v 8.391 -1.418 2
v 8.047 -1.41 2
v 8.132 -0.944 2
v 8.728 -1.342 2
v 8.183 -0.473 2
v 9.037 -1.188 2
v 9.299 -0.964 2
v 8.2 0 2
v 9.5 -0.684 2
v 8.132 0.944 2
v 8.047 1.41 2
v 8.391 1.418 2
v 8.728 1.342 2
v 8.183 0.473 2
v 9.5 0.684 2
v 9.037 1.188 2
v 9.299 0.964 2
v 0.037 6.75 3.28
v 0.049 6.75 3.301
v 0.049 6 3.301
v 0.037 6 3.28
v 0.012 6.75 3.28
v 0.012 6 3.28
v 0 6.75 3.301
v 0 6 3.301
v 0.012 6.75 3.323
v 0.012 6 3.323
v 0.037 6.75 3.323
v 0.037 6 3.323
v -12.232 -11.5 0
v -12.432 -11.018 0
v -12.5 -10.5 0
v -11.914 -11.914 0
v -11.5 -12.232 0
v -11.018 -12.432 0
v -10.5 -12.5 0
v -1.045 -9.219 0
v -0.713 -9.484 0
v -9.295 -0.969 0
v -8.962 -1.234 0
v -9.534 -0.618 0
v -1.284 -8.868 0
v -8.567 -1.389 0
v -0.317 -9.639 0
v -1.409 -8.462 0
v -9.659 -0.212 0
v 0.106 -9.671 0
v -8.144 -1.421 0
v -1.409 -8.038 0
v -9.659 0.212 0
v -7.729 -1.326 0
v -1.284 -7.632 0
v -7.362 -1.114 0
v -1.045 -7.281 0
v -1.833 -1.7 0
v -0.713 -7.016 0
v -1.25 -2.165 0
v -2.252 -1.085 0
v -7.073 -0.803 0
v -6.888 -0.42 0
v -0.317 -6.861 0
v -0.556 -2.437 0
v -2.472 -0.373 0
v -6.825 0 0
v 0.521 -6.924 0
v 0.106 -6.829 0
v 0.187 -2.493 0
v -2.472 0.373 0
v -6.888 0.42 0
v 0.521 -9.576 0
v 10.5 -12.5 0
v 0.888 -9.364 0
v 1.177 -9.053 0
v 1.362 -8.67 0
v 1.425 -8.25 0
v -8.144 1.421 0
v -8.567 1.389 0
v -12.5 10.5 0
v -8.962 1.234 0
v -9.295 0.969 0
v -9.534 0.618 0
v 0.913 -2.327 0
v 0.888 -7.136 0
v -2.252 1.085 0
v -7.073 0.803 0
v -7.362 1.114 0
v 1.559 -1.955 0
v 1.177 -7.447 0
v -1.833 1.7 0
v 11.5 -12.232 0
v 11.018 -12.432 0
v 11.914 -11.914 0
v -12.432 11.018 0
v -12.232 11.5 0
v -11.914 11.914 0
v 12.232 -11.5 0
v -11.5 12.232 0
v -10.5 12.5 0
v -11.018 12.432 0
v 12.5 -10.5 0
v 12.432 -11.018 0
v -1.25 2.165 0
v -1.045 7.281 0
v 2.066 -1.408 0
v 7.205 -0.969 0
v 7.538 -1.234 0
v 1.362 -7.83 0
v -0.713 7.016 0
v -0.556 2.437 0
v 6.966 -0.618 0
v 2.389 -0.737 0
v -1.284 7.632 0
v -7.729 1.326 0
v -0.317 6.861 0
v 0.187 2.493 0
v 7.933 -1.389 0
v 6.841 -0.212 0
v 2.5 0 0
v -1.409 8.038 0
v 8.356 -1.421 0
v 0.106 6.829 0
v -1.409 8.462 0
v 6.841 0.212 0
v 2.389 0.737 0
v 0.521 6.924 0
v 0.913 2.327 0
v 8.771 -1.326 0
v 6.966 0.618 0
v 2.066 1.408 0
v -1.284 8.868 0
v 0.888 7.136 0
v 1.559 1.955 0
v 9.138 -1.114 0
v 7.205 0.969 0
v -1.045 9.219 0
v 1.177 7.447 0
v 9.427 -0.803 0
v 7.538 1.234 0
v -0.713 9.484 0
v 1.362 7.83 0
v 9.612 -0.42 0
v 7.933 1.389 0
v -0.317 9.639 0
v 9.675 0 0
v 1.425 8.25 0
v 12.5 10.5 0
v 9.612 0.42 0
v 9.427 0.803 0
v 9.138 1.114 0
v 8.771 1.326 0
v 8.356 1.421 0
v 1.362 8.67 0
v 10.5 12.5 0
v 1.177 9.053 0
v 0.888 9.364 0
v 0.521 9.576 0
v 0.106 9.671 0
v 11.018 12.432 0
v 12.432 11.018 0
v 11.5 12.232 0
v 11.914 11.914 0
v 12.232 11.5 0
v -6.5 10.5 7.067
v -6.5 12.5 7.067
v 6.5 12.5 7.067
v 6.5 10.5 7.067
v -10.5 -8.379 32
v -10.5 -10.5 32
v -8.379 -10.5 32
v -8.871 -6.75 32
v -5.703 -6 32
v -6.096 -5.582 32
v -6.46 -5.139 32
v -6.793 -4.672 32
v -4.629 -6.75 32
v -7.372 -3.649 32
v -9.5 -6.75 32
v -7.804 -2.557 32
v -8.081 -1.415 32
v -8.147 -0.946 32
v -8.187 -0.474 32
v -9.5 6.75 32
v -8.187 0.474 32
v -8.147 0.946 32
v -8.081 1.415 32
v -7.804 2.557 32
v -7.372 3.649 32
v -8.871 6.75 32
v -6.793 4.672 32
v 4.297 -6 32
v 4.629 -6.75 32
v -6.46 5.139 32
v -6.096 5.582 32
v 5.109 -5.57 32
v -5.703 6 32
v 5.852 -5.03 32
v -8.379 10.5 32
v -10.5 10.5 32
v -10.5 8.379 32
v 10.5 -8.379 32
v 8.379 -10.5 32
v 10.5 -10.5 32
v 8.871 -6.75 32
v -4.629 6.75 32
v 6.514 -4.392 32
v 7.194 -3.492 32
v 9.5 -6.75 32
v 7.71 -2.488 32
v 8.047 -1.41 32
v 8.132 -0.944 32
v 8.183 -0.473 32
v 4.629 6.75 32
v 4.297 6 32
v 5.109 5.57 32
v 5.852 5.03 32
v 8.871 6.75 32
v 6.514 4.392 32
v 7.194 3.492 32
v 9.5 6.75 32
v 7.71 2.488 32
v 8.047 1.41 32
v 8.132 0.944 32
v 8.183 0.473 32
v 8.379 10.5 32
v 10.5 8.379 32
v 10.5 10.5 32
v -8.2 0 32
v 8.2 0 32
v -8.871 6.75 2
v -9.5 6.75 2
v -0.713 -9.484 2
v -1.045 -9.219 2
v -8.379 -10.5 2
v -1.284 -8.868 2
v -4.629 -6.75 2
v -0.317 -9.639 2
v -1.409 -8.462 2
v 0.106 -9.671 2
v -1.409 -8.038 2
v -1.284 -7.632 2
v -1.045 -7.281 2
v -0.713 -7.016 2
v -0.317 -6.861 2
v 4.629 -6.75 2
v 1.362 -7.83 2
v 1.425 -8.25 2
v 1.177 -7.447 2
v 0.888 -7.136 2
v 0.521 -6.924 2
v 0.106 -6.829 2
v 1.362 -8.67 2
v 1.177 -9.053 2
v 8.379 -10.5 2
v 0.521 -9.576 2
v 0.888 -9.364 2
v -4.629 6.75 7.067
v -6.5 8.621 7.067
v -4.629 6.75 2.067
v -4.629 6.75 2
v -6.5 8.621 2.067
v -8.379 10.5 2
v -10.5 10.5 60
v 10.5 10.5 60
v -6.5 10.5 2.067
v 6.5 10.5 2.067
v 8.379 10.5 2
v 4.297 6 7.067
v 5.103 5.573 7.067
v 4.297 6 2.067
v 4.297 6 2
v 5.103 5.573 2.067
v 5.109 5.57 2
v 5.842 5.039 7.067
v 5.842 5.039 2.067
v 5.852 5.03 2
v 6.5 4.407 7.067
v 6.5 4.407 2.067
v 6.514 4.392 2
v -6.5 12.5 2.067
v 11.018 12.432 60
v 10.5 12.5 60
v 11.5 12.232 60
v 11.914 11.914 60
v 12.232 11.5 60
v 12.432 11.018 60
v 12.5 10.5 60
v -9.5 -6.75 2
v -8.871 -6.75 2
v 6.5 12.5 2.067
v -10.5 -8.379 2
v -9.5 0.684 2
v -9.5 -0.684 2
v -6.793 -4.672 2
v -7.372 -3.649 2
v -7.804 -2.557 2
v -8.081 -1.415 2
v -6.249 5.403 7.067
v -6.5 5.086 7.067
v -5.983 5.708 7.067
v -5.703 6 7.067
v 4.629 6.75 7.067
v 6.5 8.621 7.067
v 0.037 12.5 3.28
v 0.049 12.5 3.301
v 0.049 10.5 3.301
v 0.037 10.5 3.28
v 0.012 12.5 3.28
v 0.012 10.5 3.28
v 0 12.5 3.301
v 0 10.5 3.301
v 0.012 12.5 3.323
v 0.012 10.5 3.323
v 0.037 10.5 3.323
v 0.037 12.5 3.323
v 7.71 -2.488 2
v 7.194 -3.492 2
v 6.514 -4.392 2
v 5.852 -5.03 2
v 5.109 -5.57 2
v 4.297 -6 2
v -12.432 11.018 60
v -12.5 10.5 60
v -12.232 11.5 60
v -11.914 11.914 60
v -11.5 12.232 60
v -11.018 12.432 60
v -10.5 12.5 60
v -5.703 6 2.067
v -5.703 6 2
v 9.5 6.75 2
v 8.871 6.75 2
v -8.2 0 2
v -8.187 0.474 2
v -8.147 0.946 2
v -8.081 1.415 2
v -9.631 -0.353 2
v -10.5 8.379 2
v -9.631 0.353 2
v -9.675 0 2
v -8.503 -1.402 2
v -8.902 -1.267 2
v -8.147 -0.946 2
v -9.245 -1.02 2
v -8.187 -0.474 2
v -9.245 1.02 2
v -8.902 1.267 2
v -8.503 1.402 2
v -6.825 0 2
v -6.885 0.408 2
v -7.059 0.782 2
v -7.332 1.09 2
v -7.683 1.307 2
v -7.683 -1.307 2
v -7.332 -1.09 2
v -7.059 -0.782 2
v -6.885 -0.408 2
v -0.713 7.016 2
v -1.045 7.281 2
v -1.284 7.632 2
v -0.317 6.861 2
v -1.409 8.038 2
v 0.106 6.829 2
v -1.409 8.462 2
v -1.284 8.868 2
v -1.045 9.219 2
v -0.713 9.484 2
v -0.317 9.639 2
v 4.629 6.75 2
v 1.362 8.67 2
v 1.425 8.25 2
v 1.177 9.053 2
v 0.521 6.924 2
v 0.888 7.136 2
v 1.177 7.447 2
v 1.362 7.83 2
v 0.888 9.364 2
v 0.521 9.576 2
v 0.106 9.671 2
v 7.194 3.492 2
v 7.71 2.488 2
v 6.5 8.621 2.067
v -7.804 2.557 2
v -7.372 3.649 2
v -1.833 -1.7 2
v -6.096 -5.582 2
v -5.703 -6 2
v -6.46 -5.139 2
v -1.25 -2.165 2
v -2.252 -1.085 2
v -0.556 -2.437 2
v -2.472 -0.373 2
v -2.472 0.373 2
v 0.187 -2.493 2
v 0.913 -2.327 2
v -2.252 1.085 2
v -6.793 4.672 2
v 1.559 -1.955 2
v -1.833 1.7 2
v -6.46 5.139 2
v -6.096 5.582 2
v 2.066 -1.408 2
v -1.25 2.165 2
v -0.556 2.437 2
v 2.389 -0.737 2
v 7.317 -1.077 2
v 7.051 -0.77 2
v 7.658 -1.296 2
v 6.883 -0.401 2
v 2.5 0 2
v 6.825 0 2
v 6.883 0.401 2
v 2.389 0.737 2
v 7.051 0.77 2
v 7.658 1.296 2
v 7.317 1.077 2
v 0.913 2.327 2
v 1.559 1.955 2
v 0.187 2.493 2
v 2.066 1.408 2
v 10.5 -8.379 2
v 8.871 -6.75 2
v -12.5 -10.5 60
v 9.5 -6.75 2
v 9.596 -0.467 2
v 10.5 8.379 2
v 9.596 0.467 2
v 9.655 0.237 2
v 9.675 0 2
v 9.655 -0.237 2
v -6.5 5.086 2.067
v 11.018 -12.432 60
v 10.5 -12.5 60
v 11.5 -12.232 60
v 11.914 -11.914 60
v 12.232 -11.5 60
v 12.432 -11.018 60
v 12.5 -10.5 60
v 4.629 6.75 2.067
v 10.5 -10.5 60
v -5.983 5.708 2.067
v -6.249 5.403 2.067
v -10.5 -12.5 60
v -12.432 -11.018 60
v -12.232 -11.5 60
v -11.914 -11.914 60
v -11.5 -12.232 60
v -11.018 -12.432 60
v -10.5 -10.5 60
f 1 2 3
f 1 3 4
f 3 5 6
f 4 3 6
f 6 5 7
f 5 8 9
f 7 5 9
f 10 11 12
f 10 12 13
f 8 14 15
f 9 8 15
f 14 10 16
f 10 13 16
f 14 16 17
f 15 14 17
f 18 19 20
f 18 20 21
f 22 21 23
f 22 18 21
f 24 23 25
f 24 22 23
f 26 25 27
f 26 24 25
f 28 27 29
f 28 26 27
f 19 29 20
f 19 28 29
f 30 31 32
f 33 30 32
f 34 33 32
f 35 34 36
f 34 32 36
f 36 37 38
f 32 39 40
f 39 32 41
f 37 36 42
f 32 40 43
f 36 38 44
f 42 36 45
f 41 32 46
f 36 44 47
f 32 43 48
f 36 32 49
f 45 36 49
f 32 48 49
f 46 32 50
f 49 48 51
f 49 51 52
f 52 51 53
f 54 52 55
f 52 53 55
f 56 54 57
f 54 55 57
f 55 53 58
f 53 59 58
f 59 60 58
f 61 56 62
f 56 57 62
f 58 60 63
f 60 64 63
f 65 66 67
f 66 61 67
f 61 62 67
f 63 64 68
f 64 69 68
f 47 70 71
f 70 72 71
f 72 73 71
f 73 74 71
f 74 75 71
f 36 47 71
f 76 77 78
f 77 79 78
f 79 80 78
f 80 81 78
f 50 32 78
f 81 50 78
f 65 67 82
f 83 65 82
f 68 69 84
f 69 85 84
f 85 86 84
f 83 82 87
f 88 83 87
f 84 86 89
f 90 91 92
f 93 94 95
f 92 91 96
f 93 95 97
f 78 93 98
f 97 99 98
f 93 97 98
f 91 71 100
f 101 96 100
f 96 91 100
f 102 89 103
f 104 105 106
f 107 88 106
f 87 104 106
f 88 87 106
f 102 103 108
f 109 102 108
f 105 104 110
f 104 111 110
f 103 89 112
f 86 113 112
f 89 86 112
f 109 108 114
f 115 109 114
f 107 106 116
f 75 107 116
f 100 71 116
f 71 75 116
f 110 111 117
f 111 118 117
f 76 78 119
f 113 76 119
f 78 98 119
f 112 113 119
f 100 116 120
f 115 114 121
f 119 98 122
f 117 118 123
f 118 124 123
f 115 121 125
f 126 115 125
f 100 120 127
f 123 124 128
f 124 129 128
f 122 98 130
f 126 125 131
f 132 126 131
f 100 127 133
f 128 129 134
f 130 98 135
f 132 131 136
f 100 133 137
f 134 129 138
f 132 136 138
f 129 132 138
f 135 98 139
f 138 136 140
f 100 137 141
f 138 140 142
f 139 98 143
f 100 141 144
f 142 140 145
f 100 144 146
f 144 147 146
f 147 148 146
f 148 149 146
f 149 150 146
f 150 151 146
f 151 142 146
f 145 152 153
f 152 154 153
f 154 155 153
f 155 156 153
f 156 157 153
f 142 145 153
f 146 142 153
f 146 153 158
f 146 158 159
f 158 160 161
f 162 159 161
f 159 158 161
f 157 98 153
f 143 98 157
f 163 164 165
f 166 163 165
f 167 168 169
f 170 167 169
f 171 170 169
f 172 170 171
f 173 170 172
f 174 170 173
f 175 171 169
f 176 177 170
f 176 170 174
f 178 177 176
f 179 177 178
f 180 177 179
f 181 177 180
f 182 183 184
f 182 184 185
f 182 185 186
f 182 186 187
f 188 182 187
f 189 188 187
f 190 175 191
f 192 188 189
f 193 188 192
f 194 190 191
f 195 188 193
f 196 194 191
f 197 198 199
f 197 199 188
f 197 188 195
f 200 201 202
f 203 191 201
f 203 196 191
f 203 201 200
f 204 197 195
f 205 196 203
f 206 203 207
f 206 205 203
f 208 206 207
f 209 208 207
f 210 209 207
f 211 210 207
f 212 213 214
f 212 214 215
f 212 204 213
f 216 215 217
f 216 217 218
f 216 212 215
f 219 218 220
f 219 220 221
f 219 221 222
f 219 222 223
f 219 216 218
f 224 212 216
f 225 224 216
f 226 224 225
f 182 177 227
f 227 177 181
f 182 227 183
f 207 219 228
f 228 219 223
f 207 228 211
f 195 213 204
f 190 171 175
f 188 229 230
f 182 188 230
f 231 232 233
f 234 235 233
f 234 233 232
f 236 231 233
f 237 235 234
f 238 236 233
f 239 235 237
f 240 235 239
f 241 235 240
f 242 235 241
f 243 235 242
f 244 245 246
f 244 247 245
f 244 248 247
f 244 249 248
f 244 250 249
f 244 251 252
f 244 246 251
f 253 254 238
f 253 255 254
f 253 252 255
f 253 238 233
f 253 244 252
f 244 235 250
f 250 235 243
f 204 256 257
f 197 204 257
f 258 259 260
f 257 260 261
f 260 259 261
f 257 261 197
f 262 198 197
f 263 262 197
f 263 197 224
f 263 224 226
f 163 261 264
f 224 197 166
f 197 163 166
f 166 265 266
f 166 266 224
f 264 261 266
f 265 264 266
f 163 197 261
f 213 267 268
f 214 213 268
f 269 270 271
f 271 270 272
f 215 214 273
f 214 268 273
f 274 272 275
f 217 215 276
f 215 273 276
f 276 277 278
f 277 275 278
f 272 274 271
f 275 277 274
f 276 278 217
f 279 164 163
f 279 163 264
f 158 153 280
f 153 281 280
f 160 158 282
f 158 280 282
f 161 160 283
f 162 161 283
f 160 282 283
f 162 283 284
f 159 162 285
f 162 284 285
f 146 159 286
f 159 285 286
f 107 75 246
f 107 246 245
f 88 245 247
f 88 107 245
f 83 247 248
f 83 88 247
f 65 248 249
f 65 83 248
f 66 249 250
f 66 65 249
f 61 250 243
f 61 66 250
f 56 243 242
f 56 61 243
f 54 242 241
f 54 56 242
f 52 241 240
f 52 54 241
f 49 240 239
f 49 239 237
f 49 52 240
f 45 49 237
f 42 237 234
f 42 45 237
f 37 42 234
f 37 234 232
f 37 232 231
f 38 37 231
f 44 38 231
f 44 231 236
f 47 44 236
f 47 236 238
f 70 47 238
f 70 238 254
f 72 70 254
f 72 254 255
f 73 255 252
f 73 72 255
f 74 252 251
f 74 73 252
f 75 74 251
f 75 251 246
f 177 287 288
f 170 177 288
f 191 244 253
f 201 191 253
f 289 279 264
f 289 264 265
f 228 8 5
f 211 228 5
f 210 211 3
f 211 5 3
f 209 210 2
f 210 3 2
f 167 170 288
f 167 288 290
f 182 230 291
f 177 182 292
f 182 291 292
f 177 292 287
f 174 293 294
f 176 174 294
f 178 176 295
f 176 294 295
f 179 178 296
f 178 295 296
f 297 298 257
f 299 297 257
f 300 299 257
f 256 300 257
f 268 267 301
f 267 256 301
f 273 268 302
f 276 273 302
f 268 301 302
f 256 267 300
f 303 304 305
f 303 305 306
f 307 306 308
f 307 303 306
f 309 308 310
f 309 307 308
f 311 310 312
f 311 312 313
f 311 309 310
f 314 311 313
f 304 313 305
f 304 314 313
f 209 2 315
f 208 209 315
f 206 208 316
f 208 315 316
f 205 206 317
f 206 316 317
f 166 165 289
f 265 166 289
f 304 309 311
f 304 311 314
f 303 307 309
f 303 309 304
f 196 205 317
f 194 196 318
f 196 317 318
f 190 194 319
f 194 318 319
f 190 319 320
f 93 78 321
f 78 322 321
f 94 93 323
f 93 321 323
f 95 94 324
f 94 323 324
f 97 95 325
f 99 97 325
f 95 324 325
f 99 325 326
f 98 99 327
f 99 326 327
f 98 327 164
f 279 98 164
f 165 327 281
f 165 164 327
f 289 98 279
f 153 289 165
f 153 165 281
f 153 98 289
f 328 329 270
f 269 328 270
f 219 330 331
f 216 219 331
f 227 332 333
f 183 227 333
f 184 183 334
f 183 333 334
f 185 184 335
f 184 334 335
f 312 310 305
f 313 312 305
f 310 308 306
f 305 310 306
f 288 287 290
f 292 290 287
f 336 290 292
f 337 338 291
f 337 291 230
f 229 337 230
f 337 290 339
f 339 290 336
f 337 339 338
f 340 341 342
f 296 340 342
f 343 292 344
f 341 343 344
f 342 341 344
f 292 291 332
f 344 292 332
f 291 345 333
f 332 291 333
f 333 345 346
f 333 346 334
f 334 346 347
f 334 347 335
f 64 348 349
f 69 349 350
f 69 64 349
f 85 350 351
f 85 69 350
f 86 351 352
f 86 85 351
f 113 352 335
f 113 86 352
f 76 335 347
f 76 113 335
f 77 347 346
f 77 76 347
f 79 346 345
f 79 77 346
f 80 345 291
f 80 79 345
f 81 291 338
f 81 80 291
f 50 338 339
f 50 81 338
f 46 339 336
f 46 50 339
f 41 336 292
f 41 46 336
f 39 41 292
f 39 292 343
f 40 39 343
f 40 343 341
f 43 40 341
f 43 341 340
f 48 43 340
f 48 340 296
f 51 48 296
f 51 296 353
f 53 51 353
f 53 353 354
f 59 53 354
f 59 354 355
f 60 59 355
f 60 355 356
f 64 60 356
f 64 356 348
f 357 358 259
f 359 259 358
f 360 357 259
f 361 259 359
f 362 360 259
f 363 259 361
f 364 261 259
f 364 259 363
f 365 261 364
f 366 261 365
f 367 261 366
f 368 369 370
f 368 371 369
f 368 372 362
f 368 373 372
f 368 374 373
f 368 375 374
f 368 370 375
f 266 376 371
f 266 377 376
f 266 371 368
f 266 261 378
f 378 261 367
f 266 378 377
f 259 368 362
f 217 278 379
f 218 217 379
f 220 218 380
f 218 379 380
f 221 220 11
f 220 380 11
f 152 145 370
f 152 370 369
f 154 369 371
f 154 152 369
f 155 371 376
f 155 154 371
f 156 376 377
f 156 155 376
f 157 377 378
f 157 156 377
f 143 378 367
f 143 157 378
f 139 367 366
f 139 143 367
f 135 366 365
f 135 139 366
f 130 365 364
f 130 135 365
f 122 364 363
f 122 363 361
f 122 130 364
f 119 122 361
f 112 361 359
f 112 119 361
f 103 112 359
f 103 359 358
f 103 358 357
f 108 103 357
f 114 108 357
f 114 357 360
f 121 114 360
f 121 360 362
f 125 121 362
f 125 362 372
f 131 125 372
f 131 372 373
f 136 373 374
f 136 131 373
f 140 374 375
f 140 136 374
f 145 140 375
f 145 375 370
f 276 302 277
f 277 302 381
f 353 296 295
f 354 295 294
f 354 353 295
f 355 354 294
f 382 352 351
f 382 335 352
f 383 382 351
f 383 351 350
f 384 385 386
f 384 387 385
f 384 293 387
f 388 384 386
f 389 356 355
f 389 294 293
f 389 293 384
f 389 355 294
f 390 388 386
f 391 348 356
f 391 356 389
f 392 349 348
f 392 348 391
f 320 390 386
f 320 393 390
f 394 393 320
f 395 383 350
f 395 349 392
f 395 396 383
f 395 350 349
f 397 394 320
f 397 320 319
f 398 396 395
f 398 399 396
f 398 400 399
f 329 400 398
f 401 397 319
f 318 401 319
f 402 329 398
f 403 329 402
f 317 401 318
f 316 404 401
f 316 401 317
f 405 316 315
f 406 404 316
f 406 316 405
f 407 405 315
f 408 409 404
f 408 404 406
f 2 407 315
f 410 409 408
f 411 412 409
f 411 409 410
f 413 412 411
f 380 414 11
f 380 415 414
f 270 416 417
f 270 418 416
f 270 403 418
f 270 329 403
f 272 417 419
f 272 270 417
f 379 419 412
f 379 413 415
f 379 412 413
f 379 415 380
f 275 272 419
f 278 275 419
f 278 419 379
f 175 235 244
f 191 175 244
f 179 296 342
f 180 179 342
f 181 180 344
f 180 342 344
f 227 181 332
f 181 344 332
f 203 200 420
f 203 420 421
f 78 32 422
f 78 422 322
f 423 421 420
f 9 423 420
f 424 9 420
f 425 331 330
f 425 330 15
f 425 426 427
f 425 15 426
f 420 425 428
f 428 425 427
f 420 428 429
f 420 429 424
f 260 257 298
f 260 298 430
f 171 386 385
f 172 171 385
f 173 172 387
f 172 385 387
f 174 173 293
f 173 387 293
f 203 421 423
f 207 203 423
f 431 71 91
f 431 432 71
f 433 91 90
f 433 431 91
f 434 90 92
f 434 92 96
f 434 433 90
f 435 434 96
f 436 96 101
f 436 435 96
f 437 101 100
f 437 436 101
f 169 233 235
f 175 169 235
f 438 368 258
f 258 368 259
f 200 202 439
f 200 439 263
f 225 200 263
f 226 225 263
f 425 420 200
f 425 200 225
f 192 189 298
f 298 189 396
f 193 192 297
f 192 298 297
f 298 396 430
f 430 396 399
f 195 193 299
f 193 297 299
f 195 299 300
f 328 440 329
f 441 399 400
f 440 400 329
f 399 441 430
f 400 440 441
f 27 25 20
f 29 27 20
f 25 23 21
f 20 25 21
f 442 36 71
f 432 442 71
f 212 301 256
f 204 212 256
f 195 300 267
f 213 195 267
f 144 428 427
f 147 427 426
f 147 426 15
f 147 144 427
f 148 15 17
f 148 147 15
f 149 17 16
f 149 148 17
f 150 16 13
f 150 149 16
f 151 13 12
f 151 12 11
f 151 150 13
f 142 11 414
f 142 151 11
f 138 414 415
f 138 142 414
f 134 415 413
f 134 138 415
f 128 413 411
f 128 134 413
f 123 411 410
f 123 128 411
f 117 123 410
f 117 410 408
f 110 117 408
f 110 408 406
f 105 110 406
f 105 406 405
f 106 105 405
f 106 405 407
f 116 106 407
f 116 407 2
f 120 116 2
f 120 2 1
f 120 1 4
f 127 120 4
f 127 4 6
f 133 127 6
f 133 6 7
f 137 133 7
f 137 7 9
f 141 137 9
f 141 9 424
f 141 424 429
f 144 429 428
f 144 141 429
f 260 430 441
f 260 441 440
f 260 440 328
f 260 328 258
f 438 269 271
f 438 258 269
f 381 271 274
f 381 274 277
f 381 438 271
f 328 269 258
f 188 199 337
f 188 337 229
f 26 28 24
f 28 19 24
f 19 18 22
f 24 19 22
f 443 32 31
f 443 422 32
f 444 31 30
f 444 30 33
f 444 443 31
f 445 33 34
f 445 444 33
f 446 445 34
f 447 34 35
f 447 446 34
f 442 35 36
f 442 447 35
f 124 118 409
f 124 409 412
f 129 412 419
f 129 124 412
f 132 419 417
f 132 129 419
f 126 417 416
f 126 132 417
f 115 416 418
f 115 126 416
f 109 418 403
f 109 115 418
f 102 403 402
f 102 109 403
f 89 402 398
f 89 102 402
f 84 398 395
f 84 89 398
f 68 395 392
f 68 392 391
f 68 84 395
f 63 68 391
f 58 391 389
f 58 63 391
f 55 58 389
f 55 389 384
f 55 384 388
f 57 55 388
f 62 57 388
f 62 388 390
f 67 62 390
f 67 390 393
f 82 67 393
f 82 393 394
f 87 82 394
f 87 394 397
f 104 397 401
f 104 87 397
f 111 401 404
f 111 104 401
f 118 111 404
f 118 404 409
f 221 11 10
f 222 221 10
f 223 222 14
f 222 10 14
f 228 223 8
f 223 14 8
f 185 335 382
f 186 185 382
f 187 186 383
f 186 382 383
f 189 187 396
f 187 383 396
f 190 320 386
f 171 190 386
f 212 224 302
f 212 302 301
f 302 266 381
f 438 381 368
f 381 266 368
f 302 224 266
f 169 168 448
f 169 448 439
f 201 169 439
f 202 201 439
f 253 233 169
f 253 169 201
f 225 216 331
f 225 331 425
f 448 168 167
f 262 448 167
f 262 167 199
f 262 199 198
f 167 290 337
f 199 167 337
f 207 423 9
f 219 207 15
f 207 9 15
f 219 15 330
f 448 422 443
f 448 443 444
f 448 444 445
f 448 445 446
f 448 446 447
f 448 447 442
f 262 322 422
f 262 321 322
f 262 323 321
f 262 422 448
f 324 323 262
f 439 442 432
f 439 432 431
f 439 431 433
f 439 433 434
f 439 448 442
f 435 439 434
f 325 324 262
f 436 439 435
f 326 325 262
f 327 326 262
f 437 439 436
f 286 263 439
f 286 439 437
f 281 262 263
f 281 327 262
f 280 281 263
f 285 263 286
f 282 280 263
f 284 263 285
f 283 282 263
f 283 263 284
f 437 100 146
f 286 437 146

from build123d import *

# Parameters (mm, degrees)
SKETCH1_W           = 25
SKETCH1_H           = 25
BOSS_EXTRUDE1_DEPTH = 60
SHELL1_T            = -2
SKETCH2_R           = 2.5
SKETCH2_R_2         = 1.425
CUT_EXTRUDE4_DEPTH  = 2
BOSS_EXTRUDE3_DEPTH = 30
FILLET1_R           = 2
SKETCH5_W           = 13
SKETCH5_H           = 5
SKETCH5_R           = 0.024622166
CUT_EXTRUDE6_DEPTH  = 10


with BuildPart() as part:
    # Sketch1 → Boss-Extrude1 (new body)
    with BuildSketch(Plane.XY):
        Rectangle(SKETCH1_W, SKETCH1_H)
    extrude(amount=BOSS_EXTRUDE1_DEPTH)

    # Shell1
    shell1_openings = [part.faces().sort_by_distance(p)[0] for p in [
        (0, 0, 60),
    ]]
    offset(amount=SHELL1_T, openings=shell1_openings, kind=Kind.INTERSECTION)

    # Sketch2 → Cut-Extrude4 (cut)
    with BuildSketch(Plane.XY):
        Circle(SKETCH2_R)
        with Locations((8.25, 0)):
            Circle(SKETCH2_R_2)
        with Locations((0, -8.25)):
            Circle(SKETCH2_R_2)
        with Locations((-8.25, 0)):
            Circle(SKETCH2_R_2)
        with Locations((0, 8.25)):
            Circle(SKETCH2_R_2)
    extrude(amount=CUT_EXTRUDE4_DEPTH, mode=Mode.SUBTRACT)

    # Sketch4 → Boss-Extrude3 (add)
    with BuildSketch(Plane.XY.offset(2)):
        with BuildLine():
            Line((-8.871320344, 6.75), (-6.792832126, 4.671511782))
            ThreePointArc((-6.792832126, 4.671511782), (-6.28187766, 5.363494358), (-5.703280287, 6))
            Line((-5.703280287, 6), (-3.878679656, 6))
            Line((-3.878679656, 6), (-4.628679656, 6.75))
            Line((-4.628679656, 6.75), (-8.871320344, 6.75))
        make_face()
        Polygon((-10.5, 8.378679656), (-8.871320344, 6.75), (-4.628679656, 6.75), (-8.378679656, 10.5), (-10.5, 10.5), align=None)
        Polygon((-3.878679656, 6), (0, 6), (3.878679656, 6), (4.628679656, 6.75), (-4.628679656, 6.75), align=None)
        Polygon((8.378679656, 10.5), (4.628679656, 6.75), (8.871320344, 6.75), (10.5, 8.378679656), (10.5, 10.5), align=None)
        with BuildLine():
            Line((4.628679656, 6.75), (3.878679656, 6))
            Line((3.878679656, 6), (4.296719713, 6))
            ThreePointArc((4.296719713, 6), (5.489948643, 5.313054416), (6.513606116, 4.392285772))
            Line((6.513606116, 4.392285772), (8.871320344, 6.75))
            Line((8.871320344, 6.75), (4.628679656, 6.75))
        make_face()
        with BuildLine():
            ThreePointArc((-5.703280287, -6), (-6.28187766, -5.363494358), (-6.792832126, -4.671511782))
            Line((-6.792832126, -4.671511782), (-8.871320344, -6.75))
            Line((-8.871320344, -6.75), (-4.628679656, -6.75))
            Line((-4.628679656, -6.75), (-3.878679656, -6))
            Line((-3.878679656, -6), (-5.703280287, -6))
        make_face()
        with BuildLine():
            Line((4.296719713, -6), (3.878679656, -6))
            Line((3.878679656, -6), (4.628679656, -6.75))
            Line((4.628679656, -6.75), (8.871320344, -6.75))
            Line((8.871320344, -6.75), (6.513606116, -4.392285772))
            ThreePointArc((6.513606116, -4.392285772), (5.489948643, -5.313054416), (4.296719713, -6))
        make_face()
        Polygon((-4.628679656, -6.75), (-8.871320344, -6.75), (-10.5, -8.378679656), (-10.5, -10.5), (-8.378679656, -10.5), align=None)
        Polygon((8.871320344, -6.75), (4.628679656, -6.75), (8.378679656, -10.5), (10.5, -10.5), (10.5, -8.378679656), align=None)
        with BuildLine():
            Line((8.871320344, 6.75), (6.513606116, 4.392285772))
            ThreePointArc((6.513606116, 4.392285772), (7.473760778, 3.000900651), (8.046659593, 1.410417555))
            ThreePointArc((8.046659593, 1.410417555), (8.886964121, 1.274716325), (9.5, 0.684196609))
            Line((9.5, 0.684196609), (9.5, 6.75))
            Line((9.5, 6.75), (8.871320344, 6.75))
        make_face()
        with BuildLine():
            ThreePointArc((8.046659593, -1.410417555), (7.473760778, -3.000900651), (6.513606116, -4.392285772))
            Line((6.513606116, -4.392285772), (8.871320344, -6.75))
            Line((8.871320344, -6.75), (9.5, -6.75))
            Line((9.5, -6.75), (9.5, -0.684196609))
            ThreePointArc((9.5, -0.684196609), (8.886964121, -1.274716325), (8.046659593, -1.410417555))
        make_face()
        Polygon((3.878679656, -6), (0, -6), (-3.878679656, -6), (-4.628679656, -6.75), (4.628679656, -6.75), align=None)
        with BuildLine():
            ThreePointArc((-6.792832126, -4.671511782), (-7.607218745, -3.110608316), (-8.080808179, -1.414920184))
            ThreePointArc((-8.080808179, -1.414920184), (-8.902323398, -1.26692509), (-9.5, -0.684196609))
            Line((-9.5, -0.684196609), (-9.5, -6.75))
            Line((-9.5, -6.75), (-8.871320344, -6.75))
            Line((-8.871320344, -6.75), (-6.792832126, -4.671511782))
        make_face()
        with BuildLine():
            ThreePointArc((-9.5, 0.684196609), (-8.902323398, 1.26692509), (-8.080808179, 1.414920184))
            ThreePointArc((-8.080808179, 1.414920184), (-7.607218745, 3.110608316), (-6.792832126, 4.671511782))
            Line((-6.792832126, 4.671511782), (-8.871320344, 6.75))
            Line((-8.871320344, 6.75), (-9.5, 6.75))
            Line((-9.5, 6.75), (-9.5, 0.684196609))
        make_face()
        with BuildLine():
            ThreePointArc((-8.080808179, -1.414920184), (-8.170149368, -0.709965812), (-8.2, 0))
            ThreePointArc((-8.2, 0), (-8.170149368, 0.709965812), (-8.080808179, 1.414920184))
            ThreePointArc((-8.080808179, 1.414920184), (-8.902323398, 1.26692509), (-9.5, 0.684196609))
            Line((-9.5, 0.684196609), (-9.5, -0.684196609))
            ThreePointArc((-9.5, -0.684196609), (-8.902323398, -1.26692509), (-8.080808179, -1.414920184))
        make_face()
        with BuildLine():
            ThreePointArc((8.046659593, 1.410417555), (8.161552283, 0.709364321), (8.2, 0))
            ThreePointArc((8.2, 0), (8.161552283, -0.709364321), (8.046659593, -1.410417555))
            ThreePointArc((8.046659593, -1.410417555), (8.886964121, -1.274716325), (9.5, -0.684196609))
            Line((9.5, -0.684196609), (9.5, 0.684196609))
            ThreePointArc((9.5, 0.684196609), (8.886964121, 1.274716325), (8.046659593, 1.410417555))
        make_face()
    extrude(amount=BOSS_EXTRUDE3_DEPTH)

    # Fillet1
    fillet1_edges = [part.edges().sort_by_distance(p)[0] for p in [
        (12.5, -12.5, 30),
        (-12.5, -12.5, 30),
        (-12.5, 12.5, 30),
        (12.5, 12.5, 30),
    ]]
    fillet(fillet1_edges, radius=FILLET1_R)

    # Sketch5 → Cut-Extrude6 (cut)
    with BuildSketch(Plane(origin=(0, 12.5, 0), x_dir=(1, 0, 0), z_dir=(0, 1, 0))):
        with Locations((0, -4.566766708)):
            Rectangle(SKETCH5_W, SKETCH5_H)
        with Locations((0.024622166, -3.301323142)):
            Circle(SKETCH5_R, mode=Mode.SUBTRACT)
    extrude(amount=-CUT_EXTRUDE6_DEPTH, mode=Mode.SUBTRACT)


solid = part.part
